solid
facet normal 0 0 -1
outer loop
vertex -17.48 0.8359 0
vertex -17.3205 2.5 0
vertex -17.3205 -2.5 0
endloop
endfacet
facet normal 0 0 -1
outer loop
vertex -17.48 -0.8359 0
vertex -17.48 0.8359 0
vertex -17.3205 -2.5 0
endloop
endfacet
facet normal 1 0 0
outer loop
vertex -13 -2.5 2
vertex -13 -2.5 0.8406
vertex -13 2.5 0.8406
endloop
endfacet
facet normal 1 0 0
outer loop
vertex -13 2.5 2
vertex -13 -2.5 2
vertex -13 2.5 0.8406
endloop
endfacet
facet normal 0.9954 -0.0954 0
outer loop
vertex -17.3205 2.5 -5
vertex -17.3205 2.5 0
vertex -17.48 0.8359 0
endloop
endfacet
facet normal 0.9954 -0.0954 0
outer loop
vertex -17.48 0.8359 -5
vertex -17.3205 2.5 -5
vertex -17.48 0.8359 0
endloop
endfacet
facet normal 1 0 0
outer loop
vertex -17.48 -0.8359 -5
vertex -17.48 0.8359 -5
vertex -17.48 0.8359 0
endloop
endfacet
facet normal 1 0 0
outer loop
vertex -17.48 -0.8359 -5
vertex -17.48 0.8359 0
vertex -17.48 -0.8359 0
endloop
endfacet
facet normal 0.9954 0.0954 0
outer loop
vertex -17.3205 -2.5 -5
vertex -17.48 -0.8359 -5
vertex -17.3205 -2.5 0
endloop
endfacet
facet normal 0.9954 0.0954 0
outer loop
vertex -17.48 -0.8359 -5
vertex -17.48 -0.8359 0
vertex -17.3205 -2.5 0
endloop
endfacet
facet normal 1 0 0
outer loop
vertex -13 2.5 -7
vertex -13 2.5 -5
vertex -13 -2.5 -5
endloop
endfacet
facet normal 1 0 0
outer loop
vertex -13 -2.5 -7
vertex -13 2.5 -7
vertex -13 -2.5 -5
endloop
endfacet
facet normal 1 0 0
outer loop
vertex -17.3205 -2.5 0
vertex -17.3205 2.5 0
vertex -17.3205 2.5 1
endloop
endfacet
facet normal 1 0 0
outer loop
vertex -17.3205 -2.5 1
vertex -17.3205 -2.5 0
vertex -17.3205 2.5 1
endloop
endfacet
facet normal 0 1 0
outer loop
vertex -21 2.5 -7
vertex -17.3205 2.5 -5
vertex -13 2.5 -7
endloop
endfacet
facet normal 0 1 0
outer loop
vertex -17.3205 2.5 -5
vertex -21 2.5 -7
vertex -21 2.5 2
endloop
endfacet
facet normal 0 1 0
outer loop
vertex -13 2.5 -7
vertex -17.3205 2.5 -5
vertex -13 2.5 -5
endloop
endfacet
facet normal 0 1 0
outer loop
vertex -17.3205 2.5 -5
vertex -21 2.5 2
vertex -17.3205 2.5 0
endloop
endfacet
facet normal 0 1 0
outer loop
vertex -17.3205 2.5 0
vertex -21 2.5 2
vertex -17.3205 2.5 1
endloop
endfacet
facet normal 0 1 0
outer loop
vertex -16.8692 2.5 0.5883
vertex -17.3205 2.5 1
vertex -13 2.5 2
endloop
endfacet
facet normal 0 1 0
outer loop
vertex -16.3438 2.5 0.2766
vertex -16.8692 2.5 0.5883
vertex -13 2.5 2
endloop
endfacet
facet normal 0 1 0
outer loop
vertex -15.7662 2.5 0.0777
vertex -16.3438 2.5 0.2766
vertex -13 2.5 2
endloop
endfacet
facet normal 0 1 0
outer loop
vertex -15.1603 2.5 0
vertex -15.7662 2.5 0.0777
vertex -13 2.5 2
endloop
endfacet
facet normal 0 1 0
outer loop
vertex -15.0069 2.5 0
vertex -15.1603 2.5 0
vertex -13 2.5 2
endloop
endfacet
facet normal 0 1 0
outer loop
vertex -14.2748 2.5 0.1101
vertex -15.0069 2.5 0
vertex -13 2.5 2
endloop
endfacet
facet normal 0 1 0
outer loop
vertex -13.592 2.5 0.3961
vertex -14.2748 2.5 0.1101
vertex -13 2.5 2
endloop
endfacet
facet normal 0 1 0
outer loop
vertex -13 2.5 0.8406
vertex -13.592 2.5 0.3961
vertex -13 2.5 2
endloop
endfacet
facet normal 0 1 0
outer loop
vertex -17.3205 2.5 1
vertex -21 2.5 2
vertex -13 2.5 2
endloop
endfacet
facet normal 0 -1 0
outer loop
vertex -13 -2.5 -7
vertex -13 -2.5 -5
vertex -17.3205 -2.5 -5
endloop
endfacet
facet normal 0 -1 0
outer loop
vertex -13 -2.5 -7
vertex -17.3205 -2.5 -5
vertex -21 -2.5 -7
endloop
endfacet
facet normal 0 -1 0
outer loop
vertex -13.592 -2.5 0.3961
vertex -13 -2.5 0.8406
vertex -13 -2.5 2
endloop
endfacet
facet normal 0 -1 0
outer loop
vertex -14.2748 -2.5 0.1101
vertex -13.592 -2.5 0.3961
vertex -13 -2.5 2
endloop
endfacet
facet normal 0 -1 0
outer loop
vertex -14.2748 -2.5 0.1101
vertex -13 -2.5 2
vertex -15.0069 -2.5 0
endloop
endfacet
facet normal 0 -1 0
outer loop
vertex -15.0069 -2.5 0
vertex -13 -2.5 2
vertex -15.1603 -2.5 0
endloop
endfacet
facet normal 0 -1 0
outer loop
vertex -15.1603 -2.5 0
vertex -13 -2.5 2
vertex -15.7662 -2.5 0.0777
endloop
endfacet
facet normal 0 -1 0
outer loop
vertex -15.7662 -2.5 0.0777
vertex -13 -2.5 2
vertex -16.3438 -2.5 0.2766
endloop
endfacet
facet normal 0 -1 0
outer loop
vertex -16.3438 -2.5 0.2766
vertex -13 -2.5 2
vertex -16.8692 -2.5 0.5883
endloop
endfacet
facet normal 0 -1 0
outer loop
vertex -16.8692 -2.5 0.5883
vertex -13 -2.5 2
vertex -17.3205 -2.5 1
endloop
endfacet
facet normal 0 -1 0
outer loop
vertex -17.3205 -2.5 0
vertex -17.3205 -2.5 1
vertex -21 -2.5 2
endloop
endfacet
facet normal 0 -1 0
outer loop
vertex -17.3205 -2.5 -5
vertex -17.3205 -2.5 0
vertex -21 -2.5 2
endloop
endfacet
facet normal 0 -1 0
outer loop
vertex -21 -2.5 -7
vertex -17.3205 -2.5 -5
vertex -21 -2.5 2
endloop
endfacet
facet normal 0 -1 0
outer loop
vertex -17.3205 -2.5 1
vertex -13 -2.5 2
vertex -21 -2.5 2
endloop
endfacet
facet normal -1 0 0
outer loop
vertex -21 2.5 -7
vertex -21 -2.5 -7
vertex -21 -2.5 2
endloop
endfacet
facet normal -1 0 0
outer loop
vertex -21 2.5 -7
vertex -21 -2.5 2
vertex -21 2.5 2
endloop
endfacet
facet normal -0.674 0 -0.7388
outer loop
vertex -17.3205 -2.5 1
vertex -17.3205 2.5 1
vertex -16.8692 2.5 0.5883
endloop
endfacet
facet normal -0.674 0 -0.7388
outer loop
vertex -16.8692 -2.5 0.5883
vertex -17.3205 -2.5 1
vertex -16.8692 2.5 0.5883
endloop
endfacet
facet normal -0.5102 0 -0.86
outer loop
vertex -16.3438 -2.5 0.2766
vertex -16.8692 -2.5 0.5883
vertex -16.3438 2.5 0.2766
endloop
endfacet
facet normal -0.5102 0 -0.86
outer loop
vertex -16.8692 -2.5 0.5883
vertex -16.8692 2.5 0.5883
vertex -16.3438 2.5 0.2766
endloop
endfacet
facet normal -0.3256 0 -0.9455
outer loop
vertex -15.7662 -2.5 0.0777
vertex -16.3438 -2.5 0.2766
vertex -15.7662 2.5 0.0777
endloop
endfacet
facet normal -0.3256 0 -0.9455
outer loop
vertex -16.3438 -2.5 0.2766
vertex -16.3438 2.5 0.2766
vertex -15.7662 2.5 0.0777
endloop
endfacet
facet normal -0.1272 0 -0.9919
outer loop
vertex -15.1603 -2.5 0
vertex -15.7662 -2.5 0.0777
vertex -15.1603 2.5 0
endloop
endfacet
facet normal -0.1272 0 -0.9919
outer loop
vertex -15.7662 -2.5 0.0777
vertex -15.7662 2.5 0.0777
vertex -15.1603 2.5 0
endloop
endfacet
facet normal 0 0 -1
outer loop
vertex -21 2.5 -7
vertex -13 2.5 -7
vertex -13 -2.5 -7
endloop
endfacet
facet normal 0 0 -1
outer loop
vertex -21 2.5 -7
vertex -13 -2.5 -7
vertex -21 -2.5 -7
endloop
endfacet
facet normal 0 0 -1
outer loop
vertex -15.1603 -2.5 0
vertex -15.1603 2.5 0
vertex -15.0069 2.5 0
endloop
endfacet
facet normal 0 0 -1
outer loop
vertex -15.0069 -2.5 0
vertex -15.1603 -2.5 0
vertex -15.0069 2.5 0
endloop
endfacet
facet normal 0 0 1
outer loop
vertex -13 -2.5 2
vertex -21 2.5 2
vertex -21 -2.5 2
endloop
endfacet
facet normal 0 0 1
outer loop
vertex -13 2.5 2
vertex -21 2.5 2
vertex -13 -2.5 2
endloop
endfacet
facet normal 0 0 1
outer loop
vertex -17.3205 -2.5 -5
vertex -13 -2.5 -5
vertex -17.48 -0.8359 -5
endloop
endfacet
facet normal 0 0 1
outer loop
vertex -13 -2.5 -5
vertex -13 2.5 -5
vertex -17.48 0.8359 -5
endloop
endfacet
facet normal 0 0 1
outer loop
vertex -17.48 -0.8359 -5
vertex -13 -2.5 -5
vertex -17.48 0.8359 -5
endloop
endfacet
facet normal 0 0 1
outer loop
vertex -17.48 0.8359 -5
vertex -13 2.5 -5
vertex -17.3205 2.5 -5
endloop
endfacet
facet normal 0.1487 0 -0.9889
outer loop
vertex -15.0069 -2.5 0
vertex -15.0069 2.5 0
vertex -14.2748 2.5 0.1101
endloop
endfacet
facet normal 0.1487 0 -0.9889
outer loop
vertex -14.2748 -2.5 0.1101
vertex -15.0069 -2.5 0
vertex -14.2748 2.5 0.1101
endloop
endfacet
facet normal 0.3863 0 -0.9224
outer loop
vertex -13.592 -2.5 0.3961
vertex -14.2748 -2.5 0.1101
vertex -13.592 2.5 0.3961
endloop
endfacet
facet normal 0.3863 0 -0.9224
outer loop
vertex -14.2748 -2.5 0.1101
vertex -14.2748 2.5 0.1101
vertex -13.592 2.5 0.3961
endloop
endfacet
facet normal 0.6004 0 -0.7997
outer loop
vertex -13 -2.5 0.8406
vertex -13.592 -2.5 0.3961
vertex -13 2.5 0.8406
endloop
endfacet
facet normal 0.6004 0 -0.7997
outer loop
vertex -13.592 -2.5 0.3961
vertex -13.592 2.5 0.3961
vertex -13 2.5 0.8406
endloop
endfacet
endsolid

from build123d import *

# Parameters (mm, degrees)
SKETCH1_W               = 8
SKETCH1_H               = 5
BOSS_EXTRUDE1_DEPTH     = 2
BOSS_EXTRUDE2_DEPTH     = 5
BOSS_EXTRUDE5_DEPTH     = 2
CUT_EXTRUDE2_DEPTH      = 1
CUT_EXTRUDE2_DEPTH_BACK = 6


with BuildPart() as part:
    # Sketch1 → Boss-Extrude1 (new body)
    with BuildSketch(Plane.XY):
        with Locations((-17, 0)):
            Rectangle(SKETCH1_W, SKETCH1_H)
    extrude(amount=BOSS_EXTRUDE1_DEPTH)

    # Sketch2 → Boss-Extrude2 (add)
    with BuildSketch(Plane(origin=(0, 0, 0), x_dir=(-1, 0, 0), z_dir=(0, 0, -1))):
        with BuildLine():
            Line((21, 2.5), (17.320508076, 2.5))
            ThreePointArc((17.320508076, 2.5), (17.5, 0), (17.320508076, -2.5))
            Line((17.320508076, -2.5), (21, -2.5))
            Line((21, -2.5), (21, 2.5))
        make_face()
    extrude(amount=BOSS_EXTRUDE2_DEPTH)

    # Sketch3 → Boss-Extrude5 (add)
    with BuildSketch(Plane(origin=(0, 0, -5), x_dir=(-1, 0, 0), z_dir=(0, 0, -1))):
        with BuildLine():
            Line((21, 2.5), (17.320508076, 2.5))
            ThreePointArc((17.320508076, 2.5), (17.5, 0), (17.320508076, -2.5))
            Line((17.320508076, -2.5), (21, -2.5))
            Line((21, -2.5), (21, 2.5))
        make_face()
        with BuildLine():
            Line((17.320508076, 2.5), (13, 2.5))
            Line((13, 2.5), (13, -2.5))
            Line((13, -2.5), (17.320508076, -2.5))
            ThreePointArc((17.320508076, -2.5), (17.5, 0), (17.320508076, 2.5))
        make_face()
    extrude(amount=BOSS_EXTRUDE5_DEPTH)

    # Sketch4 → Cut-Extrude2 (cut, two sides)
    with BuildSketch(Plane(origin=(0, 2.5, 0), x_dir=(1, 0, 0), z_dir=(0, 1, 0))) as cut_extrude2_sk:
        with BuildLine():
            Line((-13, 0), (-15.006873144, 0))
            ThreePointArc((-15.006873144, 0), (-13.924543455, -0.231950336), (-13, -0.840602876))
            Line((-13, -0.840602876), (-13, 0))
        make_face()
        with BuildLine():
            ThreePointArc((-17.320508076, -1), (-16.343812237, -0.276562376), (-15.160254038, 0))
            Line((-15.160254038, 0), (-17.320508076, 0))
            Line((-17.320508076, 0), (-17.320508076, -1))
        make_face()
    extrude(amount=CUT_EXTRUDE2_DEPTH, mode=Mode.SUBTRACT)
    extrude(cut_extrude2_sk.sketch, amount=-CUT_EXTRUDE2_DEPTH_BACK, mode=Mode.SUBTRACT)


solid = part.part
